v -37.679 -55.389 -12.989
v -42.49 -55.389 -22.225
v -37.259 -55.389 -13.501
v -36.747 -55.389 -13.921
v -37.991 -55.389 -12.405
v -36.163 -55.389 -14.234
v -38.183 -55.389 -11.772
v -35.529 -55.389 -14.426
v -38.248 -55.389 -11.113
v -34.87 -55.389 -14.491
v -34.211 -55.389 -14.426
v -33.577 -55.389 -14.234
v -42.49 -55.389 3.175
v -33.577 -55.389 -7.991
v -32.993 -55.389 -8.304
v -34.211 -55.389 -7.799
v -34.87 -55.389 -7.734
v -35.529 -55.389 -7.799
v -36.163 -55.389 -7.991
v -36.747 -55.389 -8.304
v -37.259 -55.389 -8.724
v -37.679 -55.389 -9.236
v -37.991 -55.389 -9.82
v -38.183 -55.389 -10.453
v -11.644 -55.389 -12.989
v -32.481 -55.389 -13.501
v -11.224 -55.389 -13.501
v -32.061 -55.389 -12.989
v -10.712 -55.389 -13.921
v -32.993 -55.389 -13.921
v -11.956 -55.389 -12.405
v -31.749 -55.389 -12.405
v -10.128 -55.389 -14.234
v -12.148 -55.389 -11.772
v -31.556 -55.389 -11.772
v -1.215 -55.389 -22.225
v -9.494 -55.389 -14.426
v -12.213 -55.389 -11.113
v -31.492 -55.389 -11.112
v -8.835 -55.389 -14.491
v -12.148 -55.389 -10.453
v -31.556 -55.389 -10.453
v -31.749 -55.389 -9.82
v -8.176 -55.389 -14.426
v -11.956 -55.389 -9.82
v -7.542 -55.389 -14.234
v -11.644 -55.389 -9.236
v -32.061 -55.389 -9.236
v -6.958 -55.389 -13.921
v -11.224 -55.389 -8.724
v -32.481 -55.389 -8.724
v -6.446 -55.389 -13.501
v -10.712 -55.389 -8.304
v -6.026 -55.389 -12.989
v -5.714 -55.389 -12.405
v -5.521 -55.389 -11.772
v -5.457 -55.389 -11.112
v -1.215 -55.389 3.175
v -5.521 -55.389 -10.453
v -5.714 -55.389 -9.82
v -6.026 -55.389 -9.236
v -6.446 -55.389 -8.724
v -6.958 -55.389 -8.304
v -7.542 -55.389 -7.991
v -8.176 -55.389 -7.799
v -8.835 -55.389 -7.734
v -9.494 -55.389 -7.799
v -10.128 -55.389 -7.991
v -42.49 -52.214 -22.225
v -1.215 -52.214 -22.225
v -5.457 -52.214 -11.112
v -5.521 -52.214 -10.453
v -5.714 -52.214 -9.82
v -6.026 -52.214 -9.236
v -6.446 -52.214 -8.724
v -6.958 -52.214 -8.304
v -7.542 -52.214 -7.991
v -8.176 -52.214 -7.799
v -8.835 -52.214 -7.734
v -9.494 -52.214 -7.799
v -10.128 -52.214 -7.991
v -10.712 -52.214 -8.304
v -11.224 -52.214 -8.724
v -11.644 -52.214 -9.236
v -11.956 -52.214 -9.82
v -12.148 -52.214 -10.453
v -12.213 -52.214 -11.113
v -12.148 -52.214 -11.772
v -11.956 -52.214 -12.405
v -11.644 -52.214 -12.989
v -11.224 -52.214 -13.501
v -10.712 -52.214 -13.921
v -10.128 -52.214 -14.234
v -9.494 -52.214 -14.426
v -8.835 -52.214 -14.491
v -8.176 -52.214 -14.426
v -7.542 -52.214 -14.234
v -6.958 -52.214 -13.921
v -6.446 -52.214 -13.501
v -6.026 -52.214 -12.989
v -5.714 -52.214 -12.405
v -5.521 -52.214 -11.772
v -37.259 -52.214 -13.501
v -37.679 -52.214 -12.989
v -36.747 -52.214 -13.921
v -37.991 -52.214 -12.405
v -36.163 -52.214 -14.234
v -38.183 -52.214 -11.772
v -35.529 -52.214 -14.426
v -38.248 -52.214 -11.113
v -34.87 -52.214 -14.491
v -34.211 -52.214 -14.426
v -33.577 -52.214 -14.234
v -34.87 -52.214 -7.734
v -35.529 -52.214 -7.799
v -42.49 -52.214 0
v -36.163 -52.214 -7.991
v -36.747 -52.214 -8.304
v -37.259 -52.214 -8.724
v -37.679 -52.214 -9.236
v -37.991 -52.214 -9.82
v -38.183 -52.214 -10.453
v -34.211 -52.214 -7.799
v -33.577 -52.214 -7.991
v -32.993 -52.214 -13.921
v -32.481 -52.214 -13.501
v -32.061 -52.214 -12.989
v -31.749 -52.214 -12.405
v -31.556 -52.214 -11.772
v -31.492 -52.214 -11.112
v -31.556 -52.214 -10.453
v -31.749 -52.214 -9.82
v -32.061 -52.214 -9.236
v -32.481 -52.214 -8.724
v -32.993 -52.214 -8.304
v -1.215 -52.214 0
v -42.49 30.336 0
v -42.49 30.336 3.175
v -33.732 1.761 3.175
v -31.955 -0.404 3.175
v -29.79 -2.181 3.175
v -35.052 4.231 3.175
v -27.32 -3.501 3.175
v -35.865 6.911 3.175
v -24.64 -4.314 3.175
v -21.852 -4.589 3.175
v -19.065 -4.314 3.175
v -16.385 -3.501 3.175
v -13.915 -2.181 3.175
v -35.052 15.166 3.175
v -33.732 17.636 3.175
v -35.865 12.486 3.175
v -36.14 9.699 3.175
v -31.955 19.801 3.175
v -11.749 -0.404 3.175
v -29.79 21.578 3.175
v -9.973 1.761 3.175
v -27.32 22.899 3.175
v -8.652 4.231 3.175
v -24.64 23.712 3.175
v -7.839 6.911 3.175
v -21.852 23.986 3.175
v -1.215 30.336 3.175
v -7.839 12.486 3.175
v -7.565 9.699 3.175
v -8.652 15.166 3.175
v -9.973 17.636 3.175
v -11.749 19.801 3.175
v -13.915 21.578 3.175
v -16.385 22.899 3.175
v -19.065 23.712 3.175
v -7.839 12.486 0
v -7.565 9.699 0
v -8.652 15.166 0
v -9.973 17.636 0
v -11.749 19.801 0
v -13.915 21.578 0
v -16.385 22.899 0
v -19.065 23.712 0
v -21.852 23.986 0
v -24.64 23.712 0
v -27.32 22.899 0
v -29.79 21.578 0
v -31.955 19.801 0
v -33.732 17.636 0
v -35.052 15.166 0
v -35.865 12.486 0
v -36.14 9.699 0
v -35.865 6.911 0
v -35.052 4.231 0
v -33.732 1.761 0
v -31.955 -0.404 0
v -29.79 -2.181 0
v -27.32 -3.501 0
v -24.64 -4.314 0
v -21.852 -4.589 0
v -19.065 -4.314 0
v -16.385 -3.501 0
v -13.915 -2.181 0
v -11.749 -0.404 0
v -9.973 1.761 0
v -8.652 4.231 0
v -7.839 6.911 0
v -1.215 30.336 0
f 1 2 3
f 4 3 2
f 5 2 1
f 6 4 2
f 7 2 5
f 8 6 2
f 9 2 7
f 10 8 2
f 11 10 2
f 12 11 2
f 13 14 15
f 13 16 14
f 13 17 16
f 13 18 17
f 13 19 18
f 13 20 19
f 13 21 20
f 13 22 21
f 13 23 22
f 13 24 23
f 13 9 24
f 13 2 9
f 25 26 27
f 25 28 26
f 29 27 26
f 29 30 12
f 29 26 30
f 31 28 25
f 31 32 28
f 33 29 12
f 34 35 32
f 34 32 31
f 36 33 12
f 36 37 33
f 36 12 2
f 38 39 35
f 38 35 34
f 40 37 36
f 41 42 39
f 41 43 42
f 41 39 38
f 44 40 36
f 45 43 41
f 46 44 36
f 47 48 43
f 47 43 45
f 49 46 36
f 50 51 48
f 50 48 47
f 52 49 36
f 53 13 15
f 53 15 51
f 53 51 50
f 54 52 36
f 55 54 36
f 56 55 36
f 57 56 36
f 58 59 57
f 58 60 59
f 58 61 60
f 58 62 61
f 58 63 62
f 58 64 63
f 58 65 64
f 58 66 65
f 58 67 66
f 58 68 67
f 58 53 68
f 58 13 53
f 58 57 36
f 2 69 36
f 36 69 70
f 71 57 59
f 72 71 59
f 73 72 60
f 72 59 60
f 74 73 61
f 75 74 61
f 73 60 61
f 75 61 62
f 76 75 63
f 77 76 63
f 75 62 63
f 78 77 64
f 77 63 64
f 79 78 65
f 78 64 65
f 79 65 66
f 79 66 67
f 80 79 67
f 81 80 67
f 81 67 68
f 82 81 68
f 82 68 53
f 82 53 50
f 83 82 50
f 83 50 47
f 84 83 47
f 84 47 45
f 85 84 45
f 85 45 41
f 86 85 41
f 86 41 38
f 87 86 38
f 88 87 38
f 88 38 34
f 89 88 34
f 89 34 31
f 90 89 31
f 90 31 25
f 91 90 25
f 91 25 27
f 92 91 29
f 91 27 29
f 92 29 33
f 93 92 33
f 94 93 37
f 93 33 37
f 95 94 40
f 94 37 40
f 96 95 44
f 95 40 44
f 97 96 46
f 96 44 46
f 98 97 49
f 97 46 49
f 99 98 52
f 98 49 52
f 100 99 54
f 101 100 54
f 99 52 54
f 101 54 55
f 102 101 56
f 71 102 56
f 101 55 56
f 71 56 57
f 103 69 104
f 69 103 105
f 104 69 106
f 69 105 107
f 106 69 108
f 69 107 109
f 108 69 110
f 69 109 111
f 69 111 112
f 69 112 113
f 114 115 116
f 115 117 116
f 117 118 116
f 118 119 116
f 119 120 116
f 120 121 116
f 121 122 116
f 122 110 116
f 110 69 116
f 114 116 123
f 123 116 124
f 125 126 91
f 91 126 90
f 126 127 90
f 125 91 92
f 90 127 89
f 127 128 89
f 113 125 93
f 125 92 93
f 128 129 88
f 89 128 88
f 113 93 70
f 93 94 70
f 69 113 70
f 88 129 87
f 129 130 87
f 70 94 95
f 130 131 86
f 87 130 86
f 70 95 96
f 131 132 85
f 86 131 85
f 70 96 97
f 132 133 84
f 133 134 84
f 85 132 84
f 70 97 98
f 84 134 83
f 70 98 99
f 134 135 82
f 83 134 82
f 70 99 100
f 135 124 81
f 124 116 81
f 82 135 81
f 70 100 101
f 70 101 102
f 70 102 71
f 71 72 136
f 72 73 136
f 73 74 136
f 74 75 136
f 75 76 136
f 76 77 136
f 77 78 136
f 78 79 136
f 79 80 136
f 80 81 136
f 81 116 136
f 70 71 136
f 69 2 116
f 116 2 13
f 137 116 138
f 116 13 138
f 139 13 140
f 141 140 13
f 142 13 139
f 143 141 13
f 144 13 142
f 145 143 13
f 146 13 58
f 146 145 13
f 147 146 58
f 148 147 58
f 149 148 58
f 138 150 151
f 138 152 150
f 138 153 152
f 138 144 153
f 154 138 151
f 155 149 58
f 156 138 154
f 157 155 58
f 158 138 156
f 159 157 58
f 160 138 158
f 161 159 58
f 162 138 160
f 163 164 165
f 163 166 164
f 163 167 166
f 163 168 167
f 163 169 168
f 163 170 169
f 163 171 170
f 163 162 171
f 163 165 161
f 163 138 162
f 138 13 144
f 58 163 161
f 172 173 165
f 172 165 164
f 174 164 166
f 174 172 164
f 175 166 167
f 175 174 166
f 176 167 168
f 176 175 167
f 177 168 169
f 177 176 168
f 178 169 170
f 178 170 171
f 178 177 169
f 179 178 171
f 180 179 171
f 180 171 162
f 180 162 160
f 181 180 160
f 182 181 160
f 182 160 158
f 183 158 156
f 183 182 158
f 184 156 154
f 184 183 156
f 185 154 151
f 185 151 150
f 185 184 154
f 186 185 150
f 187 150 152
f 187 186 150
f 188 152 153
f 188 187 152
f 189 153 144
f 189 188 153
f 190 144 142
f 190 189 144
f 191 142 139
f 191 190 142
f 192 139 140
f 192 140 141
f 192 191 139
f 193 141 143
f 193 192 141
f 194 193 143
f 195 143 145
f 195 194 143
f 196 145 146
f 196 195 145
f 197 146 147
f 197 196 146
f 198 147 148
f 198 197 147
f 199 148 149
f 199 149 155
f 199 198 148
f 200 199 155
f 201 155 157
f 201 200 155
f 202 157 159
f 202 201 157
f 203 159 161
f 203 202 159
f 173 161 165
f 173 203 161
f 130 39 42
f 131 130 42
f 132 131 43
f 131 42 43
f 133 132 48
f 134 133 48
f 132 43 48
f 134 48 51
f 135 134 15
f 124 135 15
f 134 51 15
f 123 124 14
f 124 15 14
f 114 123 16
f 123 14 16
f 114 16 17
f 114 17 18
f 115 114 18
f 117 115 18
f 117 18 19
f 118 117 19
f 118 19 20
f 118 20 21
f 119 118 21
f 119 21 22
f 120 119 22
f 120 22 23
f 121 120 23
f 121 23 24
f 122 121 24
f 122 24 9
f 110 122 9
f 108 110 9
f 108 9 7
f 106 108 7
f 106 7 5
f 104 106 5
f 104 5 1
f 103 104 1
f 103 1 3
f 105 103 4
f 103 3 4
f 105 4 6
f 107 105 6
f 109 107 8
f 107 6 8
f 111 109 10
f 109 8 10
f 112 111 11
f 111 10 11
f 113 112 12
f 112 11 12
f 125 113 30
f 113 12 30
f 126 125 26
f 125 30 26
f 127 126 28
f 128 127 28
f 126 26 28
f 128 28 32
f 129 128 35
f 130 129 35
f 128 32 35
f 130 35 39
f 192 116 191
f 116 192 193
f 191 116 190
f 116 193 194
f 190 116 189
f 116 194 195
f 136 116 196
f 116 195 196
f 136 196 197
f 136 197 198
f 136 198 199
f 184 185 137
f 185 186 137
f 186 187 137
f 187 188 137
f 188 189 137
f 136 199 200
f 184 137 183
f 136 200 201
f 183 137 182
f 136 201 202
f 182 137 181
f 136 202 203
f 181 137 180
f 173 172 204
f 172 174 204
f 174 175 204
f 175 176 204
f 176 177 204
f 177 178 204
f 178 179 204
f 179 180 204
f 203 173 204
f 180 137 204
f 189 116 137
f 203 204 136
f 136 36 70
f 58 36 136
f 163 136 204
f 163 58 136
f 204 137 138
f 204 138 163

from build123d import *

# Parameters (mm, degrees)
F0_W     = 41.275
F0_H     = 82.55
F0_R     = 14.2875
F0_H_2   = 3.175
F1_DEPTH = 3.175
F2_DEPTH = 22.225
F4_D     = 6.7564
F4_DEPTH = 76.2
F4_TIP   = 2.0298273432


with BuildPart() as f1:
    # F0 (on Top) → F1 (new body)
    with BuildSketch(Plane.XY):
        with Locations((-21.8522840129, -10.9388585212)):
            Rectangle(F0_W, F0_H)
        with Locations((-21.8522840129, 9.6986414788)):
            Circle(F0_R, mode=Mode.SUBTRACT)
        with Locations((-21.8522840129, -53.8013585212)):
            Rectangle(F0_W, F0_H_2)
    extrude(amount=F1_DEPTH)

    # F0 (on Top) → F2 (join)
    with BuildSketch(Plane.XY):
        with Locations((-21.8522840129, -53.8013585212)):
            Rectangle(F0_W, F0_H_2)
    extrude(amount=-F2_DEPTH)

    # F4
    with Locations(Plane(origin=(0, -52.2138585212, 0), x_dir=(-1, 0, 0), z_dir=(0, 1, 0))):
        with Locations((8.8347840129, -11.1125), (34.8697840129, -11.1125)):
            Hole(F4_D / 2, depth=F4_DEPTH)
            with Locations((0, 0, -(F4_DEPTH + F4_TIP / 2))):  # 118° drill point
                Cone(0, F4_D / 2, F4_TIP, mode=Mode.SUBTRACT)


solid = f1.part
